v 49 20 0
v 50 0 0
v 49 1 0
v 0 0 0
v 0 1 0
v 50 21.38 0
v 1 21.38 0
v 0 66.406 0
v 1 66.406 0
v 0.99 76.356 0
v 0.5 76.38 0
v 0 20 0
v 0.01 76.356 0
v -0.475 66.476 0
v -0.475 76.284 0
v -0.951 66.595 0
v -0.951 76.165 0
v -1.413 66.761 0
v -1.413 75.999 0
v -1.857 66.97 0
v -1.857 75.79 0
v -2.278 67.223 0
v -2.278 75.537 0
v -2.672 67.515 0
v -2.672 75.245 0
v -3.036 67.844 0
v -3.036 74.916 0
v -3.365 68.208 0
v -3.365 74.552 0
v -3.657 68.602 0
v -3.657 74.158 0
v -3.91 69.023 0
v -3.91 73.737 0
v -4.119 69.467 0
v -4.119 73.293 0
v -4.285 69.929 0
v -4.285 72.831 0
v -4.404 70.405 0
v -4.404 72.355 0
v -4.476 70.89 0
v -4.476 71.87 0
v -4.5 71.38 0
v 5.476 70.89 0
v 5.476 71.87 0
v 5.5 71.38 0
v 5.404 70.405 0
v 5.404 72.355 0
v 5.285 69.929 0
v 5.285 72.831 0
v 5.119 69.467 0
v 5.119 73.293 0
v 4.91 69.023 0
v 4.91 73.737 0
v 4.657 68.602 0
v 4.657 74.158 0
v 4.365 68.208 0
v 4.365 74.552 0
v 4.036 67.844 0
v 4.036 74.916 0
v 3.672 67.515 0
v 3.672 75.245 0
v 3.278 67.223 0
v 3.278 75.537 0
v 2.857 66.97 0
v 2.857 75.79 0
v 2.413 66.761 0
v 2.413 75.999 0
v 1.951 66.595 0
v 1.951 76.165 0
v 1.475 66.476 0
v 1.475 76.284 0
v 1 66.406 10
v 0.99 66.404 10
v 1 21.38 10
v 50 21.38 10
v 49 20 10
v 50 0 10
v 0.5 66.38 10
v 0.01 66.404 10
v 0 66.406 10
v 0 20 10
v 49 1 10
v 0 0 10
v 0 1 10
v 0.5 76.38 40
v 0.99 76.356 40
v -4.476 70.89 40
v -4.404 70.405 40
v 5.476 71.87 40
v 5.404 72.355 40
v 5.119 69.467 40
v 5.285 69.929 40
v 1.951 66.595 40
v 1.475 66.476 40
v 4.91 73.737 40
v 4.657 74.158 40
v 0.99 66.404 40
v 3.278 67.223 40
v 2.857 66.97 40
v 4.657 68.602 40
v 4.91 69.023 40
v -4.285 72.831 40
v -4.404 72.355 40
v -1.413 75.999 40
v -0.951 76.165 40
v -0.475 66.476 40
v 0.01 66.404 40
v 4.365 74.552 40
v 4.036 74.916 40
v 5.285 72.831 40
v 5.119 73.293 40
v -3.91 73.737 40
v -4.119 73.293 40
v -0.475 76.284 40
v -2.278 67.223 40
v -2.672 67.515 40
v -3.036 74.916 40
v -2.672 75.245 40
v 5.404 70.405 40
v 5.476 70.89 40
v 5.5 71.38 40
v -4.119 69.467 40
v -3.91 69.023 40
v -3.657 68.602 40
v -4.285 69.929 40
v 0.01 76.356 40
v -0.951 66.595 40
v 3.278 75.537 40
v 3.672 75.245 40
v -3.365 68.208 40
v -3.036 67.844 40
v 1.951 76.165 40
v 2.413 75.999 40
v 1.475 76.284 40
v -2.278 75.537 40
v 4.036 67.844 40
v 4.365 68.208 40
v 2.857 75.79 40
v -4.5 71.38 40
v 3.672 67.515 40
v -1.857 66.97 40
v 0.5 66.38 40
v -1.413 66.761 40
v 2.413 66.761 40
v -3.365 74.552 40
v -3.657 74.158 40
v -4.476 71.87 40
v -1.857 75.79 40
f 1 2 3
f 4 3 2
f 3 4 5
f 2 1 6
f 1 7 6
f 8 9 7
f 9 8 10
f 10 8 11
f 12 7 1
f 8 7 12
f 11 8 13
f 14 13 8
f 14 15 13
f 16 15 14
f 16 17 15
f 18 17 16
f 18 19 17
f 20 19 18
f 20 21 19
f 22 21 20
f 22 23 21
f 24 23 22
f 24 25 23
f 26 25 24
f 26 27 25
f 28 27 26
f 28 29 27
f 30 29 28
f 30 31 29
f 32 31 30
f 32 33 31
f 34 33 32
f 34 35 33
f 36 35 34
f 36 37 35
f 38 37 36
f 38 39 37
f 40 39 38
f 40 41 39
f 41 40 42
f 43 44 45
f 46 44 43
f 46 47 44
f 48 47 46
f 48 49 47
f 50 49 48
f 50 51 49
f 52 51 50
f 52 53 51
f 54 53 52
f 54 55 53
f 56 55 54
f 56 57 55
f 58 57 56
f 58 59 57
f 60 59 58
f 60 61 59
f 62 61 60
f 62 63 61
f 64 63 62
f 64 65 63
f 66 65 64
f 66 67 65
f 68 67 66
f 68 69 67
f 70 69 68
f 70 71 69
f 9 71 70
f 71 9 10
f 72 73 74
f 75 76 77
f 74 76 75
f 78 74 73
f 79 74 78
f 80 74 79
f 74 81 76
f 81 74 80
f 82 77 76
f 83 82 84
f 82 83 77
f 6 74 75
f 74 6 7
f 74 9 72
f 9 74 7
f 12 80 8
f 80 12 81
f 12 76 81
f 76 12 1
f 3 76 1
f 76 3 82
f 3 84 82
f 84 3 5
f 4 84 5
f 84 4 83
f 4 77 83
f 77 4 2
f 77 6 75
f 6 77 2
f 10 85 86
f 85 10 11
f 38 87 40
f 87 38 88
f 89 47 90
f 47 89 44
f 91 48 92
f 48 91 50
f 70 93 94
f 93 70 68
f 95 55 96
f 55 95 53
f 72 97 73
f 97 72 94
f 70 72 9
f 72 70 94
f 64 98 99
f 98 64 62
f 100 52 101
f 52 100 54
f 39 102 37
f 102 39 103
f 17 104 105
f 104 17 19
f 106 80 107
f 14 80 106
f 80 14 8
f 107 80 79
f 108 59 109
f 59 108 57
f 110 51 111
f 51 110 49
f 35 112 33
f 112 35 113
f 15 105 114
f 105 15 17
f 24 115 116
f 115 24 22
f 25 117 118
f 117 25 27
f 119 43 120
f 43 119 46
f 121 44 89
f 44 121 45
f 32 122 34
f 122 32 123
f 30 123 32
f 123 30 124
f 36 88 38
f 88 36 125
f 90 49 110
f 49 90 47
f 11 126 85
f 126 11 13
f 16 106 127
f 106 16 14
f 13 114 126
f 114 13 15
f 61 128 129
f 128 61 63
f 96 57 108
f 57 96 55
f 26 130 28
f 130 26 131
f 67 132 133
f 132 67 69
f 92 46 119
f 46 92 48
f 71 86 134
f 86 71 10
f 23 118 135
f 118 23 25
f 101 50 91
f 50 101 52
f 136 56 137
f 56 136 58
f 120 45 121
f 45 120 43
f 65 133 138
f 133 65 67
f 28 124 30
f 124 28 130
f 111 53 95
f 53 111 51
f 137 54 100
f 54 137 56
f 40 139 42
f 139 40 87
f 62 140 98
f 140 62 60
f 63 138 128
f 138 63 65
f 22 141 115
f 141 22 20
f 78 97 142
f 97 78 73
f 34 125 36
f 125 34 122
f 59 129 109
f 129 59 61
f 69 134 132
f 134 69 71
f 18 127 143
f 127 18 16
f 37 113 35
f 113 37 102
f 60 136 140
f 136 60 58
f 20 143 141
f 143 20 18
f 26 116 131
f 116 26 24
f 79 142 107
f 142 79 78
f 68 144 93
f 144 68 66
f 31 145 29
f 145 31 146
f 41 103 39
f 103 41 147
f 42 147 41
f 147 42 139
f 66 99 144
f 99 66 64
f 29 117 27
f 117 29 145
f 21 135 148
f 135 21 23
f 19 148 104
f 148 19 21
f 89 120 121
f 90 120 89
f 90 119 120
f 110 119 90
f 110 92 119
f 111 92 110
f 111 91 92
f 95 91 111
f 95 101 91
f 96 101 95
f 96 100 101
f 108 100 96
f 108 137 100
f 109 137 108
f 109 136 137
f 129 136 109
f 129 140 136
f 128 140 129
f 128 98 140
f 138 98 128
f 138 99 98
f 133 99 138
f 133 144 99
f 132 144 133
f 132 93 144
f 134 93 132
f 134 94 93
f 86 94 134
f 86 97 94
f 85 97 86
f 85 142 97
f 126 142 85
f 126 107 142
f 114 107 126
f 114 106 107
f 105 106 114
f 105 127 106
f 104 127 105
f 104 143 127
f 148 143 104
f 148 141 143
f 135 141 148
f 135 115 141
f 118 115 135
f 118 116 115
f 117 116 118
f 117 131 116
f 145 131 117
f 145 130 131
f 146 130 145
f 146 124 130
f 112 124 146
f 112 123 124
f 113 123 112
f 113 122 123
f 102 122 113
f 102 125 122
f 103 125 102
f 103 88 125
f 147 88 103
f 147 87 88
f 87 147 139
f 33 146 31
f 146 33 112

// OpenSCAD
mount_inner_thickness = 1;
mount_outer_thickness = 1.38;
mount_width = 10;
mount_inner_length = 50;
mount_outer_length = 50;
mount_paper_diameter = 100;
mount_diameter = 10;
mount_height = 30;
desk_thickness = 19;

linear_extrude(mount_width)
polygon([
    [0, 0],
    [mount_inner_length, 0], 
    [mount_inner_length, desk_thickness + mount_inner_thickness + mount_outer_thickness],
    [mount_inner_length - mount_outer_length + mount_inner_thickness, desk_thickness + mount_inner_thickness + mount_outer_thickness],
    [mount_inner_length - mount_outer_length + mount_inner_thickness, desk_thickness + mount_inner_thickness + mount_outer_thickness + mount_paper_diameter / 2],
    [mount_inner_length - mount_outer_length, desk_thickness + mount_inner_thickness + mount_outer_thickness + mount_paper_diameter / 2],
    [mount_inner_length - mount_outer_length, desk_thickness + mount_inner_thickness],
    [mount_inner_length - mount_inner_thickness, desk_thickness + mount_inner_thickness],
    [mount_inner_length - mount_inner_thickness, mount_inner_thickness],
    [0, mount_inner_thickness],
]);

translate([mount_inner_thickness / 2, mount_inner_thickness + desk_thickness + mount_outer_thickness + mount_paper_diameter / 2])
cylinder(d = mount_diameter, h = mount_width + mount_height, $fn = 64);
